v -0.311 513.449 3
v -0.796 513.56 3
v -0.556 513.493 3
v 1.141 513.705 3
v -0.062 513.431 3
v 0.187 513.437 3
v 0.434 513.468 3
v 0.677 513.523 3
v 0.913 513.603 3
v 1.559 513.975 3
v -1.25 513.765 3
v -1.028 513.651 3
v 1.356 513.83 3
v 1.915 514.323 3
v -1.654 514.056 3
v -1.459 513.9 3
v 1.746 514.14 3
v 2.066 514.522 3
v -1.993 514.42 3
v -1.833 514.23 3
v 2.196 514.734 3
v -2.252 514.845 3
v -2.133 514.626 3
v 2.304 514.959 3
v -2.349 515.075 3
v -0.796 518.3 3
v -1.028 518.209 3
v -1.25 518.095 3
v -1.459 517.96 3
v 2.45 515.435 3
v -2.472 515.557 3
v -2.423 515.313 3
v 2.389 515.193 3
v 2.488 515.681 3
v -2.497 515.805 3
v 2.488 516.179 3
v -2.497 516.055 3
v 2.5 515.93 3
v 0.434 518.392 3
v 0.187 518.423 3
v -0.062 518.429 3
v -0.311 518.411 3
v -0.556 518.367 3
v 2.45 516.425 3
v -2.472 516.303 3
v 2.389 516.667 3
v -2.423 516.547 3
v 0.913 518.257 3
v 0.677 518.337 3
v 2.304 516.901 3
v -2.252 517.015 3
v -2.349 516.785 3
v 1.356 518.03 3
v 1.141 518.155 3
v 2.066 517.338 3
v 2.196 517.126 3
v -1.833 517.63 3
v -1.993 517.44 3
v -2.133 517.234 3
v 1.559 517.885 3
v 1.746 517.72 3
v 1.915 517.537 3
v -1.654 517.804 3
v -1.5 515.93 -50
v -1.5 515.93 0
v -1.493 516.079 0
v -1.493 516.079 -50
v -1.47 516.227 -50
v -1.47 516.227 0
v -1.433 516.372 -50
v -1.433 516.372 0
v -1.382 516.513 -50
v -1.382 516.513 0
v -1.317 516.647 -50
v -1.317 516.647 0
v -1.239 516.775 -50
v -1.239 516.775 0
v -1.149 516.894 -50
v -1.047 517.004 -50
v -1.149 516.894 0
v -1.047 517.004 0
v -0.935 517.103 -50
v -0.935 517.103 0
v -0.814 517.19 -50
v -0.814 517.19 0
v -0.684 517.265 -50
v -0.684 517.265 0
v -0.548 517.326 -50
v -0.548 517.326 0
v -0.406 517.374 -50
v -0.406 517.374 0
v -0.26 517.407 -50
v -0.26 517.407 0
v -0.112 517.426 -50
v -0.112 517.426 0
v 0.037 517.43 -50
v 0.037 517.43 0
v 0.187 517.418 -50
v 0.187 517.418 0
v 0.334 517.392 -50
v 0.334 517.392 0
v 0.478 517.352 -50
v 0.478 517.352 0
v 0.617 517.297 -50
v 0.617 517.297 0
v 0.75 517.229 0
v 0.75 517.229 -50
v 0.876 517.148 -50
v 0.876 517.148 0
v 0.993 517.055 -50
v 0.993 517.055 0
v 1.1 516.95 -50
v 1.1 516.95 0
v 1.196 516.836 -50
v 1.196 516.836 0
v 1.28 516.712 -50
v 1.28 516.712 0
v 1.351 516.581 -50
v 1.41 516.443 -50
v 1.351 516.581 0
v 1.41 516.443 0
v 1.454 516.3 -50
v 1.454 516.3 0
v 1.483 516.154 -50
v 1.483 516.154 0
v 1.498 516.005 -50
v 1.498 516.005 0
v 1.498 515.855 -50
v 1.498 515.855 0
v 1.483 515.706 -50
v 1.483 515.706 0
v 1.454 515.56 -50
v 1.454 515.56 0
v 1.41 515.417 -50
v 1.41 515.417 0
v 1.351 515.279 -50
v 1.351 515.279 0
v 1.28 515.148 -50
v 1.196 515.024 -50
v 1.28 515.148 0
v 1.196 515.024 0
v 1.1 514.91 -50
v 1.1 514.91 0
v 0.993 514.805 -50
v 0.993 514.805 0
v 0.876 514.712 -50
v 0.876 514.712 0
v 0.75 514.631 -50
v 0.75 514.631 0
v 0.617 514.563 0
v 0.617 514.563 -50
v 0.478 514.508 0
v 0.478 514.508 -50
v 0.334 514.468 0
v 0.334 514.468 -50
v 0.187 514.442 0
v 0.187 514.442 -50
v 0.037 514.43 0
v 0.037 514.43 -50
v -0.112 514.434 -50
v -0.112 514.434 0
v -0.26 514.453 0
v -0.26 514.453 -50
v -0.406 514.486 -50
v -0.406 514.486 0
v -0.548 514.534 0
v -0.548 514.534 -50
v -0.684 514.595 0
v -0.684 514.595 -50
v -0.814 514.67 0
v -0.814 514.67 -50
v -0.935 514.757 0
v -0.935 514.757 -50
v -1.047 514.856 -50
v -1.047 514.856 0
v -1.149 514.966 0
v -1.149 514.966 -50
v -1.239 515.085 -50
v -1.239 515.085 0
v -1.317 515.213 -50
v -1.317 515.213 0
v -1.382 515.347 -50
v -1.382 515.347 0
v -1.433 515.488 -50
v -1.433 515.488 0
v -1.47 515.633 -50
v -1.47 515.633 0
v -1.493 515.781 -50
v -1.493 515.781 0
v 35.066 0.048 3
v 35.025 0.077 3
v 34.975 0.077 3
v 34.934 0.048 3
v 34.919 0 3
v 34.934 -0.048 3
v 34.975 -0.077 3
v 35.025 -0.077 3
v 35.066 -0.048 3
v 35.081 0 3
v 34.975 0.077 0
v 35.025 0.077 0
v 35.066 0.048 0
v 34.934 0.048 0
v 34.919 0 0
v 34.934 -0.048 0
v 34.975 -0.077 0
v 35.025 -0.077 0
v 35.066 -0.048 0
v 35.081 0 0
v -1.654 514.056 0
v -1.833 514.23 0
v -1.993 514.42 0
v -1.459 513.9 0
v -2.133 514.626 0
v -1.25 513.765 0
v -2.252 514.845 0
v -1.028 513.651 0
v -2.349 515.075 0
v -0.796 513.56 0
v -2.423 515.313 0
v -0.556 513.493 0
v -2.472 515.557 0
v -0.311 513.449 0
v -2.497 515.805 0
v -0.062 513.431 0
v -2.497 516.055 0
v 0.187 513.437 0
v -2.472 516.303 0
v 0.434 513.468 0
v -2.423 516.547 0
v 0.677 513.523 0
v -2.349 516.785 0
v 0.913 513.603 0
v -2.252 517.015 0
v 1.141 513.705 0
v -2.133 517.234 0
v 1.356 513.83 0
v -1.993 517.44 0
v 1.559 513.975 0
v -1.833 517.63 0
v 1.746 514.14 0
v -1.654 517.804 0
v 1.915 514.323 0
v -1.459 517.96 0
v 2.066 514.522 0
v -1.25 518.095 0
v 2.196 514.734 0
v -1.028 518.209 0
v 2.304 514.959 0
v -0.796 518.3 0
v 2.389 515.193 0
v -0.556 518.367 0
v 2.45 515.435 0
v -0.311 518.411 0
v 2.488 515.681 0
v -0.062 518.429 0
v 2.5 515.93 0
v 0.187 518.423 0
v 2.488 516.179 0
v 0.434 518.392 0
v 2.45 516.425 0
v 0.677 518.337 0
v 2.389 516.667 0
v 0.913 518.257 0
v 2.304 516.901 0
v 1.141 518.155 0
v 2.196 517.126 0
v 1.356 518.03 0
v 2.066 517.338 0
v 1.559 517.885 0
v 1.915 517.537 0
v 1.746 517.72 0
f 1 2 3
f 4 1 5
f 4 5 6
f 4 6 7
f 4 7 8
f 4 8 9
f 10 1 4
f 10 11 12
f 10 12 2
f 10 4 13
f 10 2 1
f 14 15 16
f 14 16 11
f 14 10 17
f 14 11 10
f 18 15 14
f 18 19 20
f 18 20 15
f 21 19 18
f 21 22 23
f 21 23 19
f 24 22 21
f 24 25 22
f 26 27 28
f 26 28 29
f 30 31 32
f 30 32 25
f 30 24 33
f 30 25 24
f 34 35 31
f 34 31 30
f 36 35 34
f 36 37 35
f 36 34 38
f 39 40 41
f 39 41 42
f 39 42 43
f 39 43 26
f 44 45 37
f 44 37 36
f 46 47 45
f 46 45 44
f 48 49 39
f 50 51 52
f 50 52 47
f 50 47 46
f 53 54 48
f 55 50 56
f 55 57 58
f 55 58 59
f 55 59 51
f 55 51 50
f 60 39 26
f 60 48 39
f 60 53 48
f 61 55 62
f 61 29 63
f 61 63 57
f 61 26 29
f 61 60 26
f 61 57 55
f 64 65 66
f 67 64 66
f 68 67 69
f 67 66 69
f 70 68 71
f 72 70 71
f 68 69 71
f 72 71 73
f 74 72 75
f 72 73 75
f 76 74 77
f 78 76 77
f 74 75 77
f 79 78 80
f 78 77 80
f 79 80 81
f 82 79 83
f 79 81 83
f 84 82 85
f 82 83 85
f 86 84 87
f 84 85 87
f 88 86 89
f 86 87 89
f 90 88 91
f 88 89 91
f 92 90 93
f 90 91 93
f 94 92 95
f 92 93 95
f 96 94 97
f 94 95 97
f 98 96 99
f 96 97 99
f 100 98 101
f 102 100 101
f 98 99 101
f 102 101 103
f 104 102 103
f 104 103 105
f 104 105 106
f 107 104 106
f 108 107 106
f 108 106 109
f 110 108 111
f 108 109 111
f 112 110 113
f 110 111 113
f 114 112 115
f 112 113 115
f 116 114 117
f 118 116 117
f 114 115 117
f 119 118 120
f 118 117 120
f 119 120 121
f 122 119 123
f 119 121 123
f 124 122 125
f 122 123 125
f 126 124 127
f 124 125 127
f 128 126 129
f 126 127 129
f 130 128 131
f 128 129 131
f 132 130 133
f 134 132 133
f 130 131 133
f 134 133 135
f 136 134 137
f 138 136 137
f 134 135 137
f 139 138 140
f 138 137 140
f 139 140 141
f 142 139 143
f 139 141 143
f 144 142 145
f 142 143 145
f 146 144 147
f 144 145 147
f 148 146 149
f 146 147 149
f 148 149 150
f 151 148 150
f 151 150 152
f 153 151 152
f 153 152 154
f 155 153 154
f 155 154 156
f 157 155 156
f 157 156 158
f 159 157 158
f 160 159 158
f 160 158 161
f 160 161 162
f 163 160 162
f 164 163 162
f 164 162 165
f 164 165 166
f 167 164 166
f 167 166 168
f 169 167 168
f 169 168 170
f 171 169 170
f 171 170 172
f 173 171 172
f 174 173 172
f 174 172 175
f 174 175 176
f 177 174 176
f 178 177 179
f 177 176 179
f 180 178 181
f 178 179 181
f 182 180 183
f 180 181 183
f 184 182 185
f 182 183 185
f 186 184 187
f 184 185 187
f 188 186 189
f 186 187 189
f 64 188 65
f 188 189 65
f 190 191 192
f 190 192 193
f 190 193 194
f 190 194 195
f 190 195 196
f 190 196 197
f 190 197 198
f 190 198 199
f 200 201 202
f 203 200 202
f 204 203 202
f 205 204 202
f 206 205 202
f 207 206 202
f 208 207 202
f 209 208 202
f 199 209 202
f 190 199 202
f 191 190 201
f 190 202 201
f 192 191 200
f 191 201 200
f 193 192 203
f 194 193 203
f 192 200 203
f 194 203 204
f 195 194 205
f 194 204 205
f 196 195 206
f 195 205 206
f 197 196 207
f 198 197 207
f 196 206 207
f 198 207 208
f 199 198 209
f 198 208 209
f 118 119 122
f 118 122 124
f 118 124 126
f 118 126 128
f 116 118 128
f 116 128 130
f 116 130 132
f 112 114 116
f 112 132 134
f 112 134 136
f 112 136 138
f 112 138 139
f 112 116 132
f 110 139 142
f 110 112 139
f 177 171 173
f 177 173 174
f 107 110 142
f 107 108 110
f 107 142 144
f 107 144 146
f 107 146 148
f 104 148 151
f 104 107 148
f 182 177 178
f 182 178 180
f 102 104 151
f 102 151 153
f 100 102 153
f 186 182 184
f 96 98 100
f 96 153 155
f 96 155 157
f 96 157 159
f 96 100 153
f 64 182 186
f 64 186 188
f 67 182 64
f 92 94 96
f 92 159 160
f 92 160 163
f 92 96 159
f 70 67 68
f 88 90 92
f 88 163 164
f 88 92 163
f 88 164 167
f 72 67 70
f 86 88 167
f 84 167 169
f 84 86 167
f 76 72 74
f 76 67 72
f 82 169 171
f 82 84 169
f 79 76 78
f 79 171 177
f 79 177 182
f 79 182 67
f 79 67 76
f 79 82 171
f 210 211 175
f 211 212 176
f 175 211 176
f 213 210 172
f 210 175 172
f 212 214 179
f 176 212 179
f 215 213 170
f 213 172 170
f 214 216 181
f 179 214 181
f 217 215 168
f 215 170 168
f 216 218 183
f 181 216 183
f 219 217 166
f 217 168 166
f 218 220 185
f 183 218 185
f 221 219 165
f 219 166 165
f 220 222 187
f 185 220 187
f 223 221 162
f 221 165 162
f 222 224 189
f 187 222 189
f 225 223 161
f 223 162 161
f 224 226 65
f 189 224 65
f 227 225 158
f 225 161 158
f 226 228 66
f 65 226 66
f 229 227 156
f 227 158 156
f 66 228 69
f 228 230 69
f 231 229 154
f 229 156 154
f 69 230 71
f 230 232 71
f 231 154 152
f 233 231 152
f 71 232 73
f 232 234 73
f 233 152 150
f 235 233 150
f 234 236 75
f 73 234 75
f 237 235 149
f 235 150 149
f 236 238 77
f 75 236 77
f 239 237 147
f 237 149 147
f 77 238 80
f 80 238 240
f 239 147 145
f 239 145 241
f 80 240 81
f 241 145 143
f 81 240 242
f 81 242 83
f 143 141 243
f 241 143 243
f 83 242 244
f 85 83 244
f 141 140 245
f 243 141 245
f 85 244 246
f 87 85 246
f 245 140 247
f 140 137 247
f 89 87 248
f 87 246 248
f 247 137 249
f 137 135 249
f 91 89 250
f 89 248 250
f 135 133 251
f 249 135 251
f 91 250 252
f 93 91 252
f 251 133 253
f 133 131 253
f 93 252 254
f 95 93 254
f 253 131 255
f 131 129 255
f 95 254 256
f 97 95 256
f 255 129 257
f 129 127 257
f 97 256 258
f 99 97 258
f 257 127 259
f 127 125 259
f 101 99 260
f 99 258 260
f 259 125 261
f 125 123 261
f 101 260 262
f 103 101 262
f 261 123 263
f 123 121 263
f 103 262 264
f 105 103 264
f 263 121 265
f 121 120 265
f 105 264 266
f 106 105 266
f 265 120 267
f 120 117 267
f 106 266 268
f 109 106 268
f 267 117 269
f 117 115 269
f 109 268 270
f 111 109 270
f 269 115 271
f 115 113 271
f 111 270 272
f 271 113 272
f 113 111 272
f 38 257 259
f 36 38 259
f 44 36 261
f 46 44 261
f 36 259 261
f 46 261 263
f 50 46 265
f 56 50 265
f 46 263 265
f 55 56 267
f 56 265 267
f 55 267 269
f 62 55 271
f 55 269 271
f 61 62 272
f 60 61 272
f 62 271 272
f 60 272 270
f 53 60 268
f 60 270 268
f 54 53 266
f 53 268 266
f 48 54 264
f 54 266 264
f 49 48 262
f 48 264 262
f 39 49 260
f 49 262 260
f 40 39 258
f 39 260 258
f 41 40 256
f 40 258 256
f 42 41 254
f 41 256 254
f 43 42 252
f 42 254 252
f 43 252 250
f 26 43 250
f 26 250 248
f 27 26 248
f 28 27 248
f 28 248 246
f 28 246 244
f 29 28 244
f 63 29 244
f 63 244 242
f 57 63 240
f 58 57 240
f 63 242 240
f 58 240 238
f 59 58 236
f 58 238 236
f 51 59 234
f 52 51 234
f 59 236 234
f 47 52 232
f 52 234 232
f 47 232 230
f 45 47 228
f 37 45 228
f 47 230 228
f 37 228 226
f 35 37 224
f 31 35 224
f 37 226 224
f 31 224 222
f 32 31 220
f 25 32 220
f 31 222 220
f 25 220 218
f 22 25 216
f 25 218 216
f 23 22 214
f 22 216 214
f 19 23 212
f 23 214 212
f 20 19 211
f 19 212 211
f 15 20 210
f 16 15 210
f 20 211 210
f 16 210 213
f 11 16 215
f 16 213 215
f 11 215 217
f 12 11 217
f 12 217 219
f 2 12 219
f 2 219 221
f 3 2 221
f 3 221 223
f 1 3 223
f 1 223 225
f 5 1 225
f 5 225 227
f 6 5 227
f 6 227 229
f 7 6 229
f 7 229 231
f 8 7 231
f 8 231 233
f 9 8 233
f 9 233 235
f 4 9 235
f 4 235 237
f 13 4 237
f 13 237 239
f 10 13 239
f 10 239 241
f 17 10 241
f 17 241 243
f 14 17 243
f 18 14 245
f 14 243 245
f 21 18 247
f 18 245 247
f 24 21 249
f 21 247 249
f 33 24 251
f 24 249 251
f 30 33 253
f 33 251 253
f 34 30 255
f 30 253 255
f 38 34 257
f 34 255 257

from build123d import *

# Parameters (mm, degrees)
SKETCH1_R             = 0.081171159
BOSS_EXTRUDE1_DEPTH   = 3
SKETCH1_R_2           = 2.5
BOSS_EXTRUDE1_2_DEPTH = 3
SKETCH2_R             = 1.5
BOSS_EXTRUDE2_DEPTH   = 50


with BuildPart() as part:
    # Sketch1 → Boss-Extrude1 (new body)
    with BuildSketch(Plane.XY):
        with Locations((35, 0)):
            Circle(SKETCH1_R)
    extrude(amount=BOSS_EXTRUDE1_DEPTH)


with BuildPart() as body_2:
    # Sketch1 → Boss-Extrude1 2 (new body)
    with BuildSketch(Plane.XY):
        with Locations((0, 515.93)):
            Circle(SKETCH1_R_2)
    extrude(amount=BOSS_EXTRUDE1_2_DEPTH)

    # Sketch2 → Boss-Extrude2 (add)
    with BuildSketch(Plane(origin=(0, 0, 0), x_dir=(-1, 0, 0), z_dir=(0, 0, -1))):
        with Locations((0, 515.93)):
            Circle(SKETCH2_R)
    extrude(amount=BOSS_EXTRUDE2_DEPTH)


solid = Compound([part.part, body_2.part])
